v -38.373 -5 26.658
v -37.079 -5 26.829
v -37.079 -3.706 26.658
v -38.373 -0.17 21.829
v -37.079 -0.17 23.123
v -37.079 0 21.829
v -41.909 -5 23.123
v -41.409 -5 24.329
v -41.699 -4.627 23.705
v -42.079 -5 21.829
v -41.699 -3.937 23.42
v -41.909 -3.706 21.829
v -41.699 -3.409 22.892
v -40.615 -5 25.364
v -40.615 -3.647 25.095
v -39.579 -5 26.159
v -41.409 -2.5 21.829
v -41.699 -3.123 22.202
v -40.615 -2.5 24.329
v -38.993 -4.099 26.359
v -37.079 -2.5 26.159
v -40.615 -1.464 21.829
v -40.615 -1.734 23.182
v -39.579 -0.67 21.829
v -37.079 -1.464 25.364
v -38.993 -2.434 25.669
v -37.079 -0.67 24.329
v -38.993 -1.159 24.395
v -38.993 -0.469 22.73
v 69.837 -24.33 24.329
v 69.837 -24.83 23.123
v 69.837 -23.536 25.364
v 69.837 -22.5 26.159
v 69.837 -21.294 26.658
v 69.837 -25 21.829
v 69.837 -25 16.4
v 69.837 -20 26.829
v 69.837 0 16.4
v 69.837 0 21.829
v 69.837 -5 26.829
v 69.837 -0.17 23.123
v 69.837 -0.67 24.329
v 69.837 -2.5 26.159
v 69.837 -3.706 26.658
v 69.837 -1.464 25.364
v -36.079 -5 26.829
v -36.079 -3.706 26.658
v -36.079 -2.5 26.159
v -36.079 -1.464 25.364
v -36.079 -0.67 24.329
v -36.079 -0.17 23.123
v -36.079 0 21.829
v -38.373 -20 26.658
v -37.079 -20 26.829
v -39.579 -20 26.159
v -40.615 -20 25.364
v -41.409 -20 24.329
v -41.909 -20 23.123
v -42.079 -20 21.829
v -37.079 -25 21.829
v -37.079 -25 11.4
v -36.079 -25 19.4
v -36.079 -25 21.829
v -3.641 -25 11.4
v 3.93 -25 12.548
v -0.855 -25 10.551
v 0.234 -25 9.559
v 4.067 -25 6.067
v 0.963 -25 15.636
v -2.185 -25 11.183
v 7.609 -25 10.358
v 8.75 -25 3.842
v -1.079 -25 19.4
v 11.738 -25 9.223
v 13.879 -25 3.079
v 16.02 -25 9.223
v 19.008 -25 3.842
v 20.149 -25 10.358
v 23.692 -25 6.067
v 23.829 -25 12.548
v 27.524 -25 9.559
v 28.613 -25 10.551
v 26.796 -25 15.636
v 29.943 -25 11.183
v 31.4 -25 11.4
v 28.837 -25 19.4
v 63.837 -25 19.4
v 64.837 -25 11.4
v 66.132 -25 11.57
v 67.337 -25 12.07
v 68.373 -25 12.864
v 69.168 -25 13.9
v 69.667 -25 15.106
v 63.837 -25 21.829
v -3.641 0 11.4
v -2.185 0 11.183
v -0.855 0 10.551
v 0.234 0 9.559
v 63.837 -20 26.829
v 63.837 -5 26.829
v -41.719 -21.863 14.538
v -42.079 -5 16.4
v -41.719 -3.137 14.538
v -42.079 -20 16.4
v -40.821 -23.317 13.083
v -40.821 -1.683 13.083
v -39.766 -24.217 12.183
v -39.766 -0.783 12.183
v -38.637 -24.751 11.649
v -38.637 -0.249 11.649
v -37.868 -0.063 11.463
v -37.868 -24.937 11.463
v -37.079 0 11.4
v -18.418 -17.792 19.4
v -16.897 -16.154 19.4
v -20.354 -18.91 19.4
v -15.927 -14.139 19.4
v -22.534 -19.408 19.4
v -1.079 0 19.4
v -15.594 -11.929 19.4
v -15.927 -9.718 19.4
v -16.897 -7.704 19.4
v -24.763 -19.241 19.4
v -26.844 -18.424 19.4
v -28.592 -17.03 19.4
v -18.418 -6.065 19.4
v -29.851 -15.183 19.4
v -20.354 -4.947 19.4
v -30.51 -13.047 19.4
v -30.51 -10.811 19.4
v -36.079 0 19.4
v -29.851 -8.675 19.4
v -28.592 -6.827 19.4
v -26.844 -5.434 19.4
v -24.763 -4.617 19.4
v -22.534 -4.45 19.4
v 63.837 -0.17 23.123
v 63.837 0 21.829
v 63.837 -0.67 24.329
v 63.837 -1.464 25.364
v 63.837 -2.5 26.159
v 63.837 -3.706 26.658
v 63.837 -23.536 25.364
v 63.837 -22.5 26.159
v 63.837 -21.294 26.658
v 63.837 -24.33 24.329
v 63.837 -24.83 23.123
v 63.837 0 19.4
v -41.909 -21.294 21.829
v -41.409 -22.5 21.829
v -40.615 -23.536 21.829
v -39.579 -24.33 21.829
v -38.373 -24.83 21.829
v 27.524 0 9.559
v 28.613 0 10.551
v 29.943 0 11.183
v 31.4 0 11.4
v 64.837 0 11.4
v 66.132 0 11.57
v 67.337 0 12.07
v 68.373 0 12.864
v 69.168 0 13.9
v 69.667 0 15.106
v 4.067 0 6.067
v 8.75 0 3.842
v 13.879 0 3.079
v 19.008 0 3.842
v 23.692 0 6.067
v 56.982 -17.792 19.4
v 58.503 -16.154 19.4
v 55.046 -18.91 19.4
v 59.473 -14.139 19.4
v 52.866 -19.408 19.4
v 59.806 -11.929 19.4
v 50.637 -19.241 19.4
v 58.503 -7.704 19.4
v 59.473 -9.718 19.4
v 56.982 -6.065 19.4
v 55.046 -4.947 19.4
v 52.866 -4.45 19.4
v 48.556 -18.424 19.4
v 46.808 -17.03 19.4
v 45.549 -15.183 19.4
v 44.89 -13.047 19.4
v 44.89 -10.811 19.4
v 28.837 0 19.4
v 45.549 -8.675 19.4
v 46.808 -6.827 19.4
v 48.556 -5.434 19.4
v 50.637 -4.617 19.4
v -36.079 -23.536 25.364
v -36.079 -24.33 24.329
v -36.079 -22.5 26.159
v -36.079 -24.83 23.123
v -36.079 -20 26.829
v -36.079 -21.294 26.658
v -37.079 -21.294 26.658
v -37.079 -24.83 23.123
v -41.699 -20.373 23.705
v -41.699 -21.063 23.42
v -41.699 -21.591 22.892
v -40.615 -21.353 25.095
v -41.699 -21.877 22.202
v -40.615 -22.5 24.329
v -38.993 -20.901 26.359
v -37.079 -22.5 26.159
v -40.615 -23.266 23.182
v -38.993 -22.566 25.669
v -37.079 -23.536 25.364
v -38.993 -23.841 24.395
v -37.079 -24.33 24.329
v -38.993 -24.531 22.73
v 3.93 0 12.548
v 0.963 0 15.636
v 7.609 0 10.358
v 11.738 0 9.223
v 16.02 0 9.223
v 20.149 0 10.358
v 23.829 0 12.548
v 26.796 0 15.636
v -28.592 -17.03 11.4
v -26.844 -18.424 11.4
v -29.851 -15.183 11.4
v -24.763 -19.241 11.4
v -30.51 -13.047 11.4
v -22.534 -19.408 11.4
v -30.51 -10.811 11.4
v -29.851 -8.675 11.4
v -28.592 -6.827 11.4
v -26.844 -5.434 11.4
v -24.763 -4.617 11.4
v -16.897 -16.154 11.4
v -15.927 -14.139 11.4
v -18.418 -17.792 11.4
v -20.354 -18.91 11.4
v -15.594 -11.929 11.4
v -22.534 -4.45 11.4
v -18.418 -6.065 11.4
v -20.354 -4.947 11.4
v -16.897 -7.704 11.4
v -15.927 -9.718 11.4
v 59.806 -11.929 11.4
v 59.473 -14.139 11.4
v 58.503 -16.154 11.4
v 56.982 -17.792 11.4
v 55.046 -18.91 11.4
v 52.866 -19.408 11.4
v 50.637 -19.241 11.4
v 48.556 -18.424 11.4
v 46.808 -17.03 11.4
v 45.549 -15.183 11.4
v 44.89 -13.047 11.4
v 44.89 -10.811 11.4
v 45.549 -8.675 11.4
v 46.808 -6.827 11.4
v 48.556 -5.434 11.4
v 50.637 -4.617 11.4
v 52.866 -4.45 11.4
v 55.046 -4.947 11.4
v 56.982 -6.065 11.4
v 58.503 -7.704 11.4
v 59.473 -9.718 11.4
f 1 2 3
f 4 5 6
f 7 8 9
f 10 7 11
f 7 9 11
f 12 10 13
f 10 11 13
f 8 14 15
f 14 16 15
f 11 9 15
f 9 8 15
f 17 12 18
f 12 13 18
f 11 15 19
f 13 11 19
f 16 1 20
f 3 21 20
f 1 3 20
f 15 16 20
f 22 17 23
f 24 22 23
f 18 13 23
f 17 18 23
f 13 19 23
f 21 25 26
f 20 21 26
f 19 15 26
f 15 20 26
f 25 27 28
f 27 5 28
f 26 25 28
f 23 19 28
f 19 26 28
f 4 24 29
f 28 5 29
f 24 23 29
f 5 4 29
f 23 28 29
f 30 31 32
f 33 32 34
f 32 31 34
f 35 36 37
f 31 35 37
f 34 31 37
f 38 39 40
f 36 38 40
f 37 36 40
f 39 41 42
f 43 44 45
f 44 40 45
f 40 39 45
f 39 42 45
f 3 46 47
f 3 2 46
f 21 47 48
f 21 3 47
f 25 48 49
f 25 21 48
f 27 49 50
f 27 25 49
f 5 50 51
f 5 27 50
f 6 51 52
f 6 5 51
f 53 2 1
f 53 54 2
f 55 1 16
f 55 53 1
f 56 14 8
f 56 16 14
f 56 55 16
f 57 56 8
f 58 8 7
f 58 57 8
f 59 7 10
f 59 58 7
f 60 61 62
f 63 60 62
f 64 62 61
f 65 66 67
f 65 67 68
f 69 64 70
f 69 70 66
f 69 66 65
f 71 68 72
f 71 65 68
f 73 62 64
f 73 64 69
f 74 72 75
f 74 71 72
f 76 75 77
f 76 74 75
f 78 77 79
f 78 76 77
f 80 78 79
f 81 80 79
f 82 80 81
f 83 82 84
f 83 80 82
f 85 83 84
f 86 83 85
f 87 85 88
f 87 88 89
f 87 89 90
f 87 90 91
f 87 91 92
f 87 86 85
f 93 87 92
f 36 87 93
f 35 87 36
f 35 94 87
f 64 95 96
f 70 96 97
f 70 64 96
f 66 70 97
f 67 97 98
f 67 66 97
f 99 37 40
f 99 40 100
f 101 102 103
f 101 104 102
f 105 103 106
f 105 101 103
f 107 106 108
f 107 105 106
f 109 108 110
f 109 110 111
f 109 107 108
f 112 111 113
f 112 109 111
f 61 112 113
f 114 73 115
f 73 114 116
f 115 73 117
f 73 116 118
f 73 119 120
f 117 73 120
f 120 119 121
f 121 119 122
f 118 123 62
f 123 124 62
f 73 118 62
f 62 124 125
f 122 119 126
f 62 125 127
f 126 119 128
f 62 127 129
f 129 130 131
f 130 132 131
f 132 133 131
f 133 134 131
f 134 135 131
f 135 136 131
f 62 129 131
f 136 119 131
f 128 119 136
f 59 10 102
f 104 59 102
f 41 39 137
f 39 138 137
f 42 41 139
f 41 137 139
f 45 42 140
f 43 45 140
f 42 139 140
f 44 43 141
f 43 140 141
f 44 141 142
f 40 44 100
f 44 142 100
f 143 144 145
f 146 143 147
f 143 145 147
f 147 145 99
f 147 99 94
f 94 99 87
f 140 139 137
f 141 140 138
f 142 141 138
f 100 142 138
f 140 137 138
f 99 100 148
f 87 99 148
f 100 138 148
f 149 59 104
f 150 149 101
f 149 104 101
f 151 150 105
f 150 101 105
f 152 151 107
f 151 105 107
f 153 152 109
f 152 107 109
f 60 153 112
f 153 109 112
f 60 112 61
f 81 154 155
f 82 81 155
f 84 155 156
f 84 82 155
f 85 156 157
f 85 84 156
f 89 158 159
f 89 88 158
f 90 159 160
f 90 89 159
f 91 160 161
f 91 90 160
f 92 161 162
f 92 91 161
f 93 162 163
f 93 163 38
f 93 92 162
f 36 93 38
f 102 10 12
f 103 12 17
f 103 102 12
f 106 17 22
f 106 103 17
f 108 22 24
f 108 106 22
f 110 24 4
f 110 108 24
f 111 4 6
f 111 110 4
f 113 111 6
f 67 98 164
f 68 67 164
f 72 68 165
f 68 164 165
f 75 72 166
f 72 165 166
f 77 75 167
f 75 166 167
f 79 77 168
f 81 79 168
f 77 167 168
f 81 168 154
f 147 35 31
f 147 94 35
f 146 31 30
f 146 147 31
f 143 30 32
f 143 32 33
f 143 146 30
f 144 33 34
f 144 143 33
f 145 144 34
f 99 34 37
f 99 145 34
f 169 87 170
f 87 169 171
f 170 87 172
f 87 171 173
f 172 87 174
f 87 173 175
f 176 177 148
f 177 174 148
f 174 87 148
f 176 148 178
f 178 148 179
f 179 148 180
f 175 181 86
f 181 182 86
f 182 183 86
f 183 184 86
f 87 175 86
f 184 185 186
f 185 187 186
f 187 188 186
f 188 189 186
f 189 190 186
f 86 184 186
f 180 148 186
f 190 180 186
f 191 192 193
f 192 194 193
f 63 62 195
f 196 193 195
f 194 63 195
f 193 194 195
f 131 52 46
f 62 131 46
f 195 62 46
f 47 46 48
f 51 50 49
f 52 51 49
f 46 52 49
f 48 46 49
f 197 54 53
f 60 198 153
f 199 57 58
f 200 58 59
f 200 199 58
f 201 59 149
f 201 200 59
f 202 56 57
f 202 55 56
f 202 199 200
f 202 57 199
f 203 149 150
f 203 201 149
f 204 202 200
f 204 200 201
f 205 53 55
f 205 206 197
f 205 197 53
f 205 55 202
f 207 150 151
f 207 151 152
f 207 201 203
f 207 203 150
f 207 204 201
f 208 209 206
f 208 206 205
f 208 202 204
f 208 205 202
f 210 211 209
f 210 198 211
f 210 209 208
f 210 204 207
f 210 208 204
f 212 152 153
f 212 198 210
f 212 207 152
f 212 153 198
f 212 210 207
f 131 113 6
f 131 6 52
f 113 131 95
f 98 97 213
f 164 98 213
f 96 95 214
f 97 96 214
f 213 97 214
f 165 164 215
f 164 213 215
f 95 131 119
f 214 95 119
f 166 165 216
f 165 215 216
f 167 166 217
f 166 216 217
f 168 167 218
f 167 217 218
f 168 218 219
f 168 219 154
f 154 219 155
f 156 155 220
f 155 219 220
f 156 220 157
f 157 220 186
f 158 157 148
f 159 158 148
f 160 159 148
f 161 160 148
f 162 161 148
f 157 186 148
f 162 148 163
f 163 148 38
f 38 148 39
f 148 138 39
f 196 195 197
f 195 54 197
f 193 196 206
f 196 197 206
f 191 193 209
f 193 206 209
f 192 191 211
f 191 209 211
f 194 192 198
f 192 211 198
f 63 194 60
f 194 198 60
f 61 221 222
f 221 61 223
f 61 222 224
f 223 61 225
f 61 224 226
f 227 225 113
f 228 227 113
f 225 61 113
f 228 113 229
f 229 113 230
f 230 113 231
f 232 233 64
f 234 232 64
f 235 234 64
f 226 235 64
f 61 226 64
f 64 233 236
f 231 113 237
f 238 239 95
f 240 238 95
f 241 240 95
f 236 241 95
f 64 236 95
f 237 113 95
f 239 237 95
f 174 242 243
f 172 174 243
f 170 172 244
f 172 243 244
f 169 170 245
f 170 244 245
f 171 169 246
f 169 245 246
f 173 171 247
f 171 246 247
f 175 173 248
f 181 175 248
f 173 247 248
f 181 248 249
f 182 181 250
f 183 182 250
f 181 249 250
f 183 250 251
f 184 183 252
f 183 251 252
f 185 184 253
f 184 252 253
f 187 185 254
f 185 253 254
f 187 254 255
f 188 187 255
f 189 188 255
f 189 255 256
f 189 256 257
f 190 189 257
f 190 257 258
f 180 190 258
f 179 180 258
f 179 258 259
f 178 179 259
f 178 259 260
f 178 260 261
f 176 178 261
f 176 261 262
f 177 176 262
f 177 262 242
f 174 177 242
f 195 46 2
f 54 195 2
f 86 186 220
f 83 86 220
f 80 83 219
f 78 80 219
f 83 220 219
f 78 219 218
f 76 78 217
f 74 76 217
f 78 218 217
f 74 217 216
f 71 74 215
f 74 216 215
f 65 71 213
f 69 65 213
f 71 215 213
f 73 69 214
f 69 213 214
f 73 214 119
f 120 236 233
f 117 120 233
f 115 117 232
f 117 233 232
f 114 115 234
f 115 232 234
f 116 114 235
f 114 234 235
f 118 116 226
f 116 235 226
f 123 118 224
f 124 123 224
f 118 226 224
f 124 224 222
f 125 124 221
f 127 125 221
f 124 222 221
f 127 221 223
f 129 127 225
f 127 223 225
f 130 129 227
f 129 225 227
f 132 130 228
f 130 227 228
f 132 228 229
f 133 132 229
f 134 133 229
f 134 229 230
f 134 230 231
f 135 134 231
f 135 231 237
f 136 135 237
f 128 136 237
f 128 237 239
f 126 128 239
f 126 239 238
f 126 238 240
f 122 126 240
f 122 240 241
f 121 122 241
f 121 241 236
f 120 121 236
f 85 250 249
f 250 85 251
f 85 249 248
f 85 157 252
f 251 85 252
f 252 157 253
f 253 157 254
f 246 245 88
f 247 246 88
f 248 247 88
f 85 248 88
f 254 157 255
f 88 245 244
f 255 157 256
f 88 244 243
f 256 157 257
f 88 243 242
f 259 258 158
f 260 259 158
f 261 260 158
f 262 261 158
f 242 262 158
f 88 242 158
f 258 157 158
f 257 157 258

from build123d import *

# Parameters (mm, degrees)
F1_DEPTH = 25
F2_R     = 7.5
F3_DEPTH = 25
F4_R     = 5


with BuildPart() as f1:
    # F0 (on Front) → F1 (new body)
    with BuildSketch(Plane.XZ):
        with BuildLine():
            Line((-36.079331, 26.828598), (-42.079331, 26.828598))
            Line((-42.079331, 26.828598), (-42.079331, 11.400025))
            Line((-42.079331, 11.400025), (-36.079331, 11.400025))
            Line((-36.079331, 11.400025), (-1.079331, 11.400025))
            ThreePointArc((-1.079331, 11.400025), (13.879066, 3.078612), (28.837463, 11.400025))
            Line((28.837463, 11.400025), (69.837463, 11.400025))
            Line((69.837463, 11.400025), (69.837463, 26.828598))
            Line((69.837463, 26.828598), (63.837463, 26.828598))
            Line((63.837463, 26.828598), (63.837463, 19.400025))
            Line((63.837463, 19.400025), (28.837463, 19.400025))
            ThreePointArc((28.837463, 19.400025), (13.879066, 9.078612), (-1.079331, 19.400025))
            Line((-1.079331, 19.400025), (-36.079331, 19.400025))
            Line((-36.079331, 19.400025), (-36.079331, 26.828598))
        make_face()
    extrude(amount=F1_DEPTH)

    # F2 (on face) → F3 (cut)
    with BuildSketch(Plane(origin=(0, 0, 11.400025), x_dir=(1, 0, 0), z_dir=(0, 0, -1))):
        with Locations((-23.09421, 11.928692)):
            Circle(F2_R)
        with Locations((52.305905, 11.928692)):
            Circle(F2_R)
    extrude(amount=-F3_DEPTH, mode=Mode.SUBTRACT)

    # F4
    f4_edges = [f1.edges().sort_by_distance(p)[0] for p in [
        (-39.079331, -25, 26.828598),
        (-39.079331, 0, 26.828598),
        (-42.079331, -12.5, 11.400025),
        (69.837463, -12.5, 11.400025),
        (66.837463, -25, 26.828598),
        (66.837463, 0, 26.828598),
        (-1.079331, -12.5, 11.400025),
        (28.837463, -12.5, 11.400025),
        (-42.079331, -12.5, 26.828598),
        (-42.079331, 0, 19.114311),
        (-42.079331, -25, 19.114311),
    ]]
    fillet(f4_edges, radius=F4_R)


solid = f1.part
